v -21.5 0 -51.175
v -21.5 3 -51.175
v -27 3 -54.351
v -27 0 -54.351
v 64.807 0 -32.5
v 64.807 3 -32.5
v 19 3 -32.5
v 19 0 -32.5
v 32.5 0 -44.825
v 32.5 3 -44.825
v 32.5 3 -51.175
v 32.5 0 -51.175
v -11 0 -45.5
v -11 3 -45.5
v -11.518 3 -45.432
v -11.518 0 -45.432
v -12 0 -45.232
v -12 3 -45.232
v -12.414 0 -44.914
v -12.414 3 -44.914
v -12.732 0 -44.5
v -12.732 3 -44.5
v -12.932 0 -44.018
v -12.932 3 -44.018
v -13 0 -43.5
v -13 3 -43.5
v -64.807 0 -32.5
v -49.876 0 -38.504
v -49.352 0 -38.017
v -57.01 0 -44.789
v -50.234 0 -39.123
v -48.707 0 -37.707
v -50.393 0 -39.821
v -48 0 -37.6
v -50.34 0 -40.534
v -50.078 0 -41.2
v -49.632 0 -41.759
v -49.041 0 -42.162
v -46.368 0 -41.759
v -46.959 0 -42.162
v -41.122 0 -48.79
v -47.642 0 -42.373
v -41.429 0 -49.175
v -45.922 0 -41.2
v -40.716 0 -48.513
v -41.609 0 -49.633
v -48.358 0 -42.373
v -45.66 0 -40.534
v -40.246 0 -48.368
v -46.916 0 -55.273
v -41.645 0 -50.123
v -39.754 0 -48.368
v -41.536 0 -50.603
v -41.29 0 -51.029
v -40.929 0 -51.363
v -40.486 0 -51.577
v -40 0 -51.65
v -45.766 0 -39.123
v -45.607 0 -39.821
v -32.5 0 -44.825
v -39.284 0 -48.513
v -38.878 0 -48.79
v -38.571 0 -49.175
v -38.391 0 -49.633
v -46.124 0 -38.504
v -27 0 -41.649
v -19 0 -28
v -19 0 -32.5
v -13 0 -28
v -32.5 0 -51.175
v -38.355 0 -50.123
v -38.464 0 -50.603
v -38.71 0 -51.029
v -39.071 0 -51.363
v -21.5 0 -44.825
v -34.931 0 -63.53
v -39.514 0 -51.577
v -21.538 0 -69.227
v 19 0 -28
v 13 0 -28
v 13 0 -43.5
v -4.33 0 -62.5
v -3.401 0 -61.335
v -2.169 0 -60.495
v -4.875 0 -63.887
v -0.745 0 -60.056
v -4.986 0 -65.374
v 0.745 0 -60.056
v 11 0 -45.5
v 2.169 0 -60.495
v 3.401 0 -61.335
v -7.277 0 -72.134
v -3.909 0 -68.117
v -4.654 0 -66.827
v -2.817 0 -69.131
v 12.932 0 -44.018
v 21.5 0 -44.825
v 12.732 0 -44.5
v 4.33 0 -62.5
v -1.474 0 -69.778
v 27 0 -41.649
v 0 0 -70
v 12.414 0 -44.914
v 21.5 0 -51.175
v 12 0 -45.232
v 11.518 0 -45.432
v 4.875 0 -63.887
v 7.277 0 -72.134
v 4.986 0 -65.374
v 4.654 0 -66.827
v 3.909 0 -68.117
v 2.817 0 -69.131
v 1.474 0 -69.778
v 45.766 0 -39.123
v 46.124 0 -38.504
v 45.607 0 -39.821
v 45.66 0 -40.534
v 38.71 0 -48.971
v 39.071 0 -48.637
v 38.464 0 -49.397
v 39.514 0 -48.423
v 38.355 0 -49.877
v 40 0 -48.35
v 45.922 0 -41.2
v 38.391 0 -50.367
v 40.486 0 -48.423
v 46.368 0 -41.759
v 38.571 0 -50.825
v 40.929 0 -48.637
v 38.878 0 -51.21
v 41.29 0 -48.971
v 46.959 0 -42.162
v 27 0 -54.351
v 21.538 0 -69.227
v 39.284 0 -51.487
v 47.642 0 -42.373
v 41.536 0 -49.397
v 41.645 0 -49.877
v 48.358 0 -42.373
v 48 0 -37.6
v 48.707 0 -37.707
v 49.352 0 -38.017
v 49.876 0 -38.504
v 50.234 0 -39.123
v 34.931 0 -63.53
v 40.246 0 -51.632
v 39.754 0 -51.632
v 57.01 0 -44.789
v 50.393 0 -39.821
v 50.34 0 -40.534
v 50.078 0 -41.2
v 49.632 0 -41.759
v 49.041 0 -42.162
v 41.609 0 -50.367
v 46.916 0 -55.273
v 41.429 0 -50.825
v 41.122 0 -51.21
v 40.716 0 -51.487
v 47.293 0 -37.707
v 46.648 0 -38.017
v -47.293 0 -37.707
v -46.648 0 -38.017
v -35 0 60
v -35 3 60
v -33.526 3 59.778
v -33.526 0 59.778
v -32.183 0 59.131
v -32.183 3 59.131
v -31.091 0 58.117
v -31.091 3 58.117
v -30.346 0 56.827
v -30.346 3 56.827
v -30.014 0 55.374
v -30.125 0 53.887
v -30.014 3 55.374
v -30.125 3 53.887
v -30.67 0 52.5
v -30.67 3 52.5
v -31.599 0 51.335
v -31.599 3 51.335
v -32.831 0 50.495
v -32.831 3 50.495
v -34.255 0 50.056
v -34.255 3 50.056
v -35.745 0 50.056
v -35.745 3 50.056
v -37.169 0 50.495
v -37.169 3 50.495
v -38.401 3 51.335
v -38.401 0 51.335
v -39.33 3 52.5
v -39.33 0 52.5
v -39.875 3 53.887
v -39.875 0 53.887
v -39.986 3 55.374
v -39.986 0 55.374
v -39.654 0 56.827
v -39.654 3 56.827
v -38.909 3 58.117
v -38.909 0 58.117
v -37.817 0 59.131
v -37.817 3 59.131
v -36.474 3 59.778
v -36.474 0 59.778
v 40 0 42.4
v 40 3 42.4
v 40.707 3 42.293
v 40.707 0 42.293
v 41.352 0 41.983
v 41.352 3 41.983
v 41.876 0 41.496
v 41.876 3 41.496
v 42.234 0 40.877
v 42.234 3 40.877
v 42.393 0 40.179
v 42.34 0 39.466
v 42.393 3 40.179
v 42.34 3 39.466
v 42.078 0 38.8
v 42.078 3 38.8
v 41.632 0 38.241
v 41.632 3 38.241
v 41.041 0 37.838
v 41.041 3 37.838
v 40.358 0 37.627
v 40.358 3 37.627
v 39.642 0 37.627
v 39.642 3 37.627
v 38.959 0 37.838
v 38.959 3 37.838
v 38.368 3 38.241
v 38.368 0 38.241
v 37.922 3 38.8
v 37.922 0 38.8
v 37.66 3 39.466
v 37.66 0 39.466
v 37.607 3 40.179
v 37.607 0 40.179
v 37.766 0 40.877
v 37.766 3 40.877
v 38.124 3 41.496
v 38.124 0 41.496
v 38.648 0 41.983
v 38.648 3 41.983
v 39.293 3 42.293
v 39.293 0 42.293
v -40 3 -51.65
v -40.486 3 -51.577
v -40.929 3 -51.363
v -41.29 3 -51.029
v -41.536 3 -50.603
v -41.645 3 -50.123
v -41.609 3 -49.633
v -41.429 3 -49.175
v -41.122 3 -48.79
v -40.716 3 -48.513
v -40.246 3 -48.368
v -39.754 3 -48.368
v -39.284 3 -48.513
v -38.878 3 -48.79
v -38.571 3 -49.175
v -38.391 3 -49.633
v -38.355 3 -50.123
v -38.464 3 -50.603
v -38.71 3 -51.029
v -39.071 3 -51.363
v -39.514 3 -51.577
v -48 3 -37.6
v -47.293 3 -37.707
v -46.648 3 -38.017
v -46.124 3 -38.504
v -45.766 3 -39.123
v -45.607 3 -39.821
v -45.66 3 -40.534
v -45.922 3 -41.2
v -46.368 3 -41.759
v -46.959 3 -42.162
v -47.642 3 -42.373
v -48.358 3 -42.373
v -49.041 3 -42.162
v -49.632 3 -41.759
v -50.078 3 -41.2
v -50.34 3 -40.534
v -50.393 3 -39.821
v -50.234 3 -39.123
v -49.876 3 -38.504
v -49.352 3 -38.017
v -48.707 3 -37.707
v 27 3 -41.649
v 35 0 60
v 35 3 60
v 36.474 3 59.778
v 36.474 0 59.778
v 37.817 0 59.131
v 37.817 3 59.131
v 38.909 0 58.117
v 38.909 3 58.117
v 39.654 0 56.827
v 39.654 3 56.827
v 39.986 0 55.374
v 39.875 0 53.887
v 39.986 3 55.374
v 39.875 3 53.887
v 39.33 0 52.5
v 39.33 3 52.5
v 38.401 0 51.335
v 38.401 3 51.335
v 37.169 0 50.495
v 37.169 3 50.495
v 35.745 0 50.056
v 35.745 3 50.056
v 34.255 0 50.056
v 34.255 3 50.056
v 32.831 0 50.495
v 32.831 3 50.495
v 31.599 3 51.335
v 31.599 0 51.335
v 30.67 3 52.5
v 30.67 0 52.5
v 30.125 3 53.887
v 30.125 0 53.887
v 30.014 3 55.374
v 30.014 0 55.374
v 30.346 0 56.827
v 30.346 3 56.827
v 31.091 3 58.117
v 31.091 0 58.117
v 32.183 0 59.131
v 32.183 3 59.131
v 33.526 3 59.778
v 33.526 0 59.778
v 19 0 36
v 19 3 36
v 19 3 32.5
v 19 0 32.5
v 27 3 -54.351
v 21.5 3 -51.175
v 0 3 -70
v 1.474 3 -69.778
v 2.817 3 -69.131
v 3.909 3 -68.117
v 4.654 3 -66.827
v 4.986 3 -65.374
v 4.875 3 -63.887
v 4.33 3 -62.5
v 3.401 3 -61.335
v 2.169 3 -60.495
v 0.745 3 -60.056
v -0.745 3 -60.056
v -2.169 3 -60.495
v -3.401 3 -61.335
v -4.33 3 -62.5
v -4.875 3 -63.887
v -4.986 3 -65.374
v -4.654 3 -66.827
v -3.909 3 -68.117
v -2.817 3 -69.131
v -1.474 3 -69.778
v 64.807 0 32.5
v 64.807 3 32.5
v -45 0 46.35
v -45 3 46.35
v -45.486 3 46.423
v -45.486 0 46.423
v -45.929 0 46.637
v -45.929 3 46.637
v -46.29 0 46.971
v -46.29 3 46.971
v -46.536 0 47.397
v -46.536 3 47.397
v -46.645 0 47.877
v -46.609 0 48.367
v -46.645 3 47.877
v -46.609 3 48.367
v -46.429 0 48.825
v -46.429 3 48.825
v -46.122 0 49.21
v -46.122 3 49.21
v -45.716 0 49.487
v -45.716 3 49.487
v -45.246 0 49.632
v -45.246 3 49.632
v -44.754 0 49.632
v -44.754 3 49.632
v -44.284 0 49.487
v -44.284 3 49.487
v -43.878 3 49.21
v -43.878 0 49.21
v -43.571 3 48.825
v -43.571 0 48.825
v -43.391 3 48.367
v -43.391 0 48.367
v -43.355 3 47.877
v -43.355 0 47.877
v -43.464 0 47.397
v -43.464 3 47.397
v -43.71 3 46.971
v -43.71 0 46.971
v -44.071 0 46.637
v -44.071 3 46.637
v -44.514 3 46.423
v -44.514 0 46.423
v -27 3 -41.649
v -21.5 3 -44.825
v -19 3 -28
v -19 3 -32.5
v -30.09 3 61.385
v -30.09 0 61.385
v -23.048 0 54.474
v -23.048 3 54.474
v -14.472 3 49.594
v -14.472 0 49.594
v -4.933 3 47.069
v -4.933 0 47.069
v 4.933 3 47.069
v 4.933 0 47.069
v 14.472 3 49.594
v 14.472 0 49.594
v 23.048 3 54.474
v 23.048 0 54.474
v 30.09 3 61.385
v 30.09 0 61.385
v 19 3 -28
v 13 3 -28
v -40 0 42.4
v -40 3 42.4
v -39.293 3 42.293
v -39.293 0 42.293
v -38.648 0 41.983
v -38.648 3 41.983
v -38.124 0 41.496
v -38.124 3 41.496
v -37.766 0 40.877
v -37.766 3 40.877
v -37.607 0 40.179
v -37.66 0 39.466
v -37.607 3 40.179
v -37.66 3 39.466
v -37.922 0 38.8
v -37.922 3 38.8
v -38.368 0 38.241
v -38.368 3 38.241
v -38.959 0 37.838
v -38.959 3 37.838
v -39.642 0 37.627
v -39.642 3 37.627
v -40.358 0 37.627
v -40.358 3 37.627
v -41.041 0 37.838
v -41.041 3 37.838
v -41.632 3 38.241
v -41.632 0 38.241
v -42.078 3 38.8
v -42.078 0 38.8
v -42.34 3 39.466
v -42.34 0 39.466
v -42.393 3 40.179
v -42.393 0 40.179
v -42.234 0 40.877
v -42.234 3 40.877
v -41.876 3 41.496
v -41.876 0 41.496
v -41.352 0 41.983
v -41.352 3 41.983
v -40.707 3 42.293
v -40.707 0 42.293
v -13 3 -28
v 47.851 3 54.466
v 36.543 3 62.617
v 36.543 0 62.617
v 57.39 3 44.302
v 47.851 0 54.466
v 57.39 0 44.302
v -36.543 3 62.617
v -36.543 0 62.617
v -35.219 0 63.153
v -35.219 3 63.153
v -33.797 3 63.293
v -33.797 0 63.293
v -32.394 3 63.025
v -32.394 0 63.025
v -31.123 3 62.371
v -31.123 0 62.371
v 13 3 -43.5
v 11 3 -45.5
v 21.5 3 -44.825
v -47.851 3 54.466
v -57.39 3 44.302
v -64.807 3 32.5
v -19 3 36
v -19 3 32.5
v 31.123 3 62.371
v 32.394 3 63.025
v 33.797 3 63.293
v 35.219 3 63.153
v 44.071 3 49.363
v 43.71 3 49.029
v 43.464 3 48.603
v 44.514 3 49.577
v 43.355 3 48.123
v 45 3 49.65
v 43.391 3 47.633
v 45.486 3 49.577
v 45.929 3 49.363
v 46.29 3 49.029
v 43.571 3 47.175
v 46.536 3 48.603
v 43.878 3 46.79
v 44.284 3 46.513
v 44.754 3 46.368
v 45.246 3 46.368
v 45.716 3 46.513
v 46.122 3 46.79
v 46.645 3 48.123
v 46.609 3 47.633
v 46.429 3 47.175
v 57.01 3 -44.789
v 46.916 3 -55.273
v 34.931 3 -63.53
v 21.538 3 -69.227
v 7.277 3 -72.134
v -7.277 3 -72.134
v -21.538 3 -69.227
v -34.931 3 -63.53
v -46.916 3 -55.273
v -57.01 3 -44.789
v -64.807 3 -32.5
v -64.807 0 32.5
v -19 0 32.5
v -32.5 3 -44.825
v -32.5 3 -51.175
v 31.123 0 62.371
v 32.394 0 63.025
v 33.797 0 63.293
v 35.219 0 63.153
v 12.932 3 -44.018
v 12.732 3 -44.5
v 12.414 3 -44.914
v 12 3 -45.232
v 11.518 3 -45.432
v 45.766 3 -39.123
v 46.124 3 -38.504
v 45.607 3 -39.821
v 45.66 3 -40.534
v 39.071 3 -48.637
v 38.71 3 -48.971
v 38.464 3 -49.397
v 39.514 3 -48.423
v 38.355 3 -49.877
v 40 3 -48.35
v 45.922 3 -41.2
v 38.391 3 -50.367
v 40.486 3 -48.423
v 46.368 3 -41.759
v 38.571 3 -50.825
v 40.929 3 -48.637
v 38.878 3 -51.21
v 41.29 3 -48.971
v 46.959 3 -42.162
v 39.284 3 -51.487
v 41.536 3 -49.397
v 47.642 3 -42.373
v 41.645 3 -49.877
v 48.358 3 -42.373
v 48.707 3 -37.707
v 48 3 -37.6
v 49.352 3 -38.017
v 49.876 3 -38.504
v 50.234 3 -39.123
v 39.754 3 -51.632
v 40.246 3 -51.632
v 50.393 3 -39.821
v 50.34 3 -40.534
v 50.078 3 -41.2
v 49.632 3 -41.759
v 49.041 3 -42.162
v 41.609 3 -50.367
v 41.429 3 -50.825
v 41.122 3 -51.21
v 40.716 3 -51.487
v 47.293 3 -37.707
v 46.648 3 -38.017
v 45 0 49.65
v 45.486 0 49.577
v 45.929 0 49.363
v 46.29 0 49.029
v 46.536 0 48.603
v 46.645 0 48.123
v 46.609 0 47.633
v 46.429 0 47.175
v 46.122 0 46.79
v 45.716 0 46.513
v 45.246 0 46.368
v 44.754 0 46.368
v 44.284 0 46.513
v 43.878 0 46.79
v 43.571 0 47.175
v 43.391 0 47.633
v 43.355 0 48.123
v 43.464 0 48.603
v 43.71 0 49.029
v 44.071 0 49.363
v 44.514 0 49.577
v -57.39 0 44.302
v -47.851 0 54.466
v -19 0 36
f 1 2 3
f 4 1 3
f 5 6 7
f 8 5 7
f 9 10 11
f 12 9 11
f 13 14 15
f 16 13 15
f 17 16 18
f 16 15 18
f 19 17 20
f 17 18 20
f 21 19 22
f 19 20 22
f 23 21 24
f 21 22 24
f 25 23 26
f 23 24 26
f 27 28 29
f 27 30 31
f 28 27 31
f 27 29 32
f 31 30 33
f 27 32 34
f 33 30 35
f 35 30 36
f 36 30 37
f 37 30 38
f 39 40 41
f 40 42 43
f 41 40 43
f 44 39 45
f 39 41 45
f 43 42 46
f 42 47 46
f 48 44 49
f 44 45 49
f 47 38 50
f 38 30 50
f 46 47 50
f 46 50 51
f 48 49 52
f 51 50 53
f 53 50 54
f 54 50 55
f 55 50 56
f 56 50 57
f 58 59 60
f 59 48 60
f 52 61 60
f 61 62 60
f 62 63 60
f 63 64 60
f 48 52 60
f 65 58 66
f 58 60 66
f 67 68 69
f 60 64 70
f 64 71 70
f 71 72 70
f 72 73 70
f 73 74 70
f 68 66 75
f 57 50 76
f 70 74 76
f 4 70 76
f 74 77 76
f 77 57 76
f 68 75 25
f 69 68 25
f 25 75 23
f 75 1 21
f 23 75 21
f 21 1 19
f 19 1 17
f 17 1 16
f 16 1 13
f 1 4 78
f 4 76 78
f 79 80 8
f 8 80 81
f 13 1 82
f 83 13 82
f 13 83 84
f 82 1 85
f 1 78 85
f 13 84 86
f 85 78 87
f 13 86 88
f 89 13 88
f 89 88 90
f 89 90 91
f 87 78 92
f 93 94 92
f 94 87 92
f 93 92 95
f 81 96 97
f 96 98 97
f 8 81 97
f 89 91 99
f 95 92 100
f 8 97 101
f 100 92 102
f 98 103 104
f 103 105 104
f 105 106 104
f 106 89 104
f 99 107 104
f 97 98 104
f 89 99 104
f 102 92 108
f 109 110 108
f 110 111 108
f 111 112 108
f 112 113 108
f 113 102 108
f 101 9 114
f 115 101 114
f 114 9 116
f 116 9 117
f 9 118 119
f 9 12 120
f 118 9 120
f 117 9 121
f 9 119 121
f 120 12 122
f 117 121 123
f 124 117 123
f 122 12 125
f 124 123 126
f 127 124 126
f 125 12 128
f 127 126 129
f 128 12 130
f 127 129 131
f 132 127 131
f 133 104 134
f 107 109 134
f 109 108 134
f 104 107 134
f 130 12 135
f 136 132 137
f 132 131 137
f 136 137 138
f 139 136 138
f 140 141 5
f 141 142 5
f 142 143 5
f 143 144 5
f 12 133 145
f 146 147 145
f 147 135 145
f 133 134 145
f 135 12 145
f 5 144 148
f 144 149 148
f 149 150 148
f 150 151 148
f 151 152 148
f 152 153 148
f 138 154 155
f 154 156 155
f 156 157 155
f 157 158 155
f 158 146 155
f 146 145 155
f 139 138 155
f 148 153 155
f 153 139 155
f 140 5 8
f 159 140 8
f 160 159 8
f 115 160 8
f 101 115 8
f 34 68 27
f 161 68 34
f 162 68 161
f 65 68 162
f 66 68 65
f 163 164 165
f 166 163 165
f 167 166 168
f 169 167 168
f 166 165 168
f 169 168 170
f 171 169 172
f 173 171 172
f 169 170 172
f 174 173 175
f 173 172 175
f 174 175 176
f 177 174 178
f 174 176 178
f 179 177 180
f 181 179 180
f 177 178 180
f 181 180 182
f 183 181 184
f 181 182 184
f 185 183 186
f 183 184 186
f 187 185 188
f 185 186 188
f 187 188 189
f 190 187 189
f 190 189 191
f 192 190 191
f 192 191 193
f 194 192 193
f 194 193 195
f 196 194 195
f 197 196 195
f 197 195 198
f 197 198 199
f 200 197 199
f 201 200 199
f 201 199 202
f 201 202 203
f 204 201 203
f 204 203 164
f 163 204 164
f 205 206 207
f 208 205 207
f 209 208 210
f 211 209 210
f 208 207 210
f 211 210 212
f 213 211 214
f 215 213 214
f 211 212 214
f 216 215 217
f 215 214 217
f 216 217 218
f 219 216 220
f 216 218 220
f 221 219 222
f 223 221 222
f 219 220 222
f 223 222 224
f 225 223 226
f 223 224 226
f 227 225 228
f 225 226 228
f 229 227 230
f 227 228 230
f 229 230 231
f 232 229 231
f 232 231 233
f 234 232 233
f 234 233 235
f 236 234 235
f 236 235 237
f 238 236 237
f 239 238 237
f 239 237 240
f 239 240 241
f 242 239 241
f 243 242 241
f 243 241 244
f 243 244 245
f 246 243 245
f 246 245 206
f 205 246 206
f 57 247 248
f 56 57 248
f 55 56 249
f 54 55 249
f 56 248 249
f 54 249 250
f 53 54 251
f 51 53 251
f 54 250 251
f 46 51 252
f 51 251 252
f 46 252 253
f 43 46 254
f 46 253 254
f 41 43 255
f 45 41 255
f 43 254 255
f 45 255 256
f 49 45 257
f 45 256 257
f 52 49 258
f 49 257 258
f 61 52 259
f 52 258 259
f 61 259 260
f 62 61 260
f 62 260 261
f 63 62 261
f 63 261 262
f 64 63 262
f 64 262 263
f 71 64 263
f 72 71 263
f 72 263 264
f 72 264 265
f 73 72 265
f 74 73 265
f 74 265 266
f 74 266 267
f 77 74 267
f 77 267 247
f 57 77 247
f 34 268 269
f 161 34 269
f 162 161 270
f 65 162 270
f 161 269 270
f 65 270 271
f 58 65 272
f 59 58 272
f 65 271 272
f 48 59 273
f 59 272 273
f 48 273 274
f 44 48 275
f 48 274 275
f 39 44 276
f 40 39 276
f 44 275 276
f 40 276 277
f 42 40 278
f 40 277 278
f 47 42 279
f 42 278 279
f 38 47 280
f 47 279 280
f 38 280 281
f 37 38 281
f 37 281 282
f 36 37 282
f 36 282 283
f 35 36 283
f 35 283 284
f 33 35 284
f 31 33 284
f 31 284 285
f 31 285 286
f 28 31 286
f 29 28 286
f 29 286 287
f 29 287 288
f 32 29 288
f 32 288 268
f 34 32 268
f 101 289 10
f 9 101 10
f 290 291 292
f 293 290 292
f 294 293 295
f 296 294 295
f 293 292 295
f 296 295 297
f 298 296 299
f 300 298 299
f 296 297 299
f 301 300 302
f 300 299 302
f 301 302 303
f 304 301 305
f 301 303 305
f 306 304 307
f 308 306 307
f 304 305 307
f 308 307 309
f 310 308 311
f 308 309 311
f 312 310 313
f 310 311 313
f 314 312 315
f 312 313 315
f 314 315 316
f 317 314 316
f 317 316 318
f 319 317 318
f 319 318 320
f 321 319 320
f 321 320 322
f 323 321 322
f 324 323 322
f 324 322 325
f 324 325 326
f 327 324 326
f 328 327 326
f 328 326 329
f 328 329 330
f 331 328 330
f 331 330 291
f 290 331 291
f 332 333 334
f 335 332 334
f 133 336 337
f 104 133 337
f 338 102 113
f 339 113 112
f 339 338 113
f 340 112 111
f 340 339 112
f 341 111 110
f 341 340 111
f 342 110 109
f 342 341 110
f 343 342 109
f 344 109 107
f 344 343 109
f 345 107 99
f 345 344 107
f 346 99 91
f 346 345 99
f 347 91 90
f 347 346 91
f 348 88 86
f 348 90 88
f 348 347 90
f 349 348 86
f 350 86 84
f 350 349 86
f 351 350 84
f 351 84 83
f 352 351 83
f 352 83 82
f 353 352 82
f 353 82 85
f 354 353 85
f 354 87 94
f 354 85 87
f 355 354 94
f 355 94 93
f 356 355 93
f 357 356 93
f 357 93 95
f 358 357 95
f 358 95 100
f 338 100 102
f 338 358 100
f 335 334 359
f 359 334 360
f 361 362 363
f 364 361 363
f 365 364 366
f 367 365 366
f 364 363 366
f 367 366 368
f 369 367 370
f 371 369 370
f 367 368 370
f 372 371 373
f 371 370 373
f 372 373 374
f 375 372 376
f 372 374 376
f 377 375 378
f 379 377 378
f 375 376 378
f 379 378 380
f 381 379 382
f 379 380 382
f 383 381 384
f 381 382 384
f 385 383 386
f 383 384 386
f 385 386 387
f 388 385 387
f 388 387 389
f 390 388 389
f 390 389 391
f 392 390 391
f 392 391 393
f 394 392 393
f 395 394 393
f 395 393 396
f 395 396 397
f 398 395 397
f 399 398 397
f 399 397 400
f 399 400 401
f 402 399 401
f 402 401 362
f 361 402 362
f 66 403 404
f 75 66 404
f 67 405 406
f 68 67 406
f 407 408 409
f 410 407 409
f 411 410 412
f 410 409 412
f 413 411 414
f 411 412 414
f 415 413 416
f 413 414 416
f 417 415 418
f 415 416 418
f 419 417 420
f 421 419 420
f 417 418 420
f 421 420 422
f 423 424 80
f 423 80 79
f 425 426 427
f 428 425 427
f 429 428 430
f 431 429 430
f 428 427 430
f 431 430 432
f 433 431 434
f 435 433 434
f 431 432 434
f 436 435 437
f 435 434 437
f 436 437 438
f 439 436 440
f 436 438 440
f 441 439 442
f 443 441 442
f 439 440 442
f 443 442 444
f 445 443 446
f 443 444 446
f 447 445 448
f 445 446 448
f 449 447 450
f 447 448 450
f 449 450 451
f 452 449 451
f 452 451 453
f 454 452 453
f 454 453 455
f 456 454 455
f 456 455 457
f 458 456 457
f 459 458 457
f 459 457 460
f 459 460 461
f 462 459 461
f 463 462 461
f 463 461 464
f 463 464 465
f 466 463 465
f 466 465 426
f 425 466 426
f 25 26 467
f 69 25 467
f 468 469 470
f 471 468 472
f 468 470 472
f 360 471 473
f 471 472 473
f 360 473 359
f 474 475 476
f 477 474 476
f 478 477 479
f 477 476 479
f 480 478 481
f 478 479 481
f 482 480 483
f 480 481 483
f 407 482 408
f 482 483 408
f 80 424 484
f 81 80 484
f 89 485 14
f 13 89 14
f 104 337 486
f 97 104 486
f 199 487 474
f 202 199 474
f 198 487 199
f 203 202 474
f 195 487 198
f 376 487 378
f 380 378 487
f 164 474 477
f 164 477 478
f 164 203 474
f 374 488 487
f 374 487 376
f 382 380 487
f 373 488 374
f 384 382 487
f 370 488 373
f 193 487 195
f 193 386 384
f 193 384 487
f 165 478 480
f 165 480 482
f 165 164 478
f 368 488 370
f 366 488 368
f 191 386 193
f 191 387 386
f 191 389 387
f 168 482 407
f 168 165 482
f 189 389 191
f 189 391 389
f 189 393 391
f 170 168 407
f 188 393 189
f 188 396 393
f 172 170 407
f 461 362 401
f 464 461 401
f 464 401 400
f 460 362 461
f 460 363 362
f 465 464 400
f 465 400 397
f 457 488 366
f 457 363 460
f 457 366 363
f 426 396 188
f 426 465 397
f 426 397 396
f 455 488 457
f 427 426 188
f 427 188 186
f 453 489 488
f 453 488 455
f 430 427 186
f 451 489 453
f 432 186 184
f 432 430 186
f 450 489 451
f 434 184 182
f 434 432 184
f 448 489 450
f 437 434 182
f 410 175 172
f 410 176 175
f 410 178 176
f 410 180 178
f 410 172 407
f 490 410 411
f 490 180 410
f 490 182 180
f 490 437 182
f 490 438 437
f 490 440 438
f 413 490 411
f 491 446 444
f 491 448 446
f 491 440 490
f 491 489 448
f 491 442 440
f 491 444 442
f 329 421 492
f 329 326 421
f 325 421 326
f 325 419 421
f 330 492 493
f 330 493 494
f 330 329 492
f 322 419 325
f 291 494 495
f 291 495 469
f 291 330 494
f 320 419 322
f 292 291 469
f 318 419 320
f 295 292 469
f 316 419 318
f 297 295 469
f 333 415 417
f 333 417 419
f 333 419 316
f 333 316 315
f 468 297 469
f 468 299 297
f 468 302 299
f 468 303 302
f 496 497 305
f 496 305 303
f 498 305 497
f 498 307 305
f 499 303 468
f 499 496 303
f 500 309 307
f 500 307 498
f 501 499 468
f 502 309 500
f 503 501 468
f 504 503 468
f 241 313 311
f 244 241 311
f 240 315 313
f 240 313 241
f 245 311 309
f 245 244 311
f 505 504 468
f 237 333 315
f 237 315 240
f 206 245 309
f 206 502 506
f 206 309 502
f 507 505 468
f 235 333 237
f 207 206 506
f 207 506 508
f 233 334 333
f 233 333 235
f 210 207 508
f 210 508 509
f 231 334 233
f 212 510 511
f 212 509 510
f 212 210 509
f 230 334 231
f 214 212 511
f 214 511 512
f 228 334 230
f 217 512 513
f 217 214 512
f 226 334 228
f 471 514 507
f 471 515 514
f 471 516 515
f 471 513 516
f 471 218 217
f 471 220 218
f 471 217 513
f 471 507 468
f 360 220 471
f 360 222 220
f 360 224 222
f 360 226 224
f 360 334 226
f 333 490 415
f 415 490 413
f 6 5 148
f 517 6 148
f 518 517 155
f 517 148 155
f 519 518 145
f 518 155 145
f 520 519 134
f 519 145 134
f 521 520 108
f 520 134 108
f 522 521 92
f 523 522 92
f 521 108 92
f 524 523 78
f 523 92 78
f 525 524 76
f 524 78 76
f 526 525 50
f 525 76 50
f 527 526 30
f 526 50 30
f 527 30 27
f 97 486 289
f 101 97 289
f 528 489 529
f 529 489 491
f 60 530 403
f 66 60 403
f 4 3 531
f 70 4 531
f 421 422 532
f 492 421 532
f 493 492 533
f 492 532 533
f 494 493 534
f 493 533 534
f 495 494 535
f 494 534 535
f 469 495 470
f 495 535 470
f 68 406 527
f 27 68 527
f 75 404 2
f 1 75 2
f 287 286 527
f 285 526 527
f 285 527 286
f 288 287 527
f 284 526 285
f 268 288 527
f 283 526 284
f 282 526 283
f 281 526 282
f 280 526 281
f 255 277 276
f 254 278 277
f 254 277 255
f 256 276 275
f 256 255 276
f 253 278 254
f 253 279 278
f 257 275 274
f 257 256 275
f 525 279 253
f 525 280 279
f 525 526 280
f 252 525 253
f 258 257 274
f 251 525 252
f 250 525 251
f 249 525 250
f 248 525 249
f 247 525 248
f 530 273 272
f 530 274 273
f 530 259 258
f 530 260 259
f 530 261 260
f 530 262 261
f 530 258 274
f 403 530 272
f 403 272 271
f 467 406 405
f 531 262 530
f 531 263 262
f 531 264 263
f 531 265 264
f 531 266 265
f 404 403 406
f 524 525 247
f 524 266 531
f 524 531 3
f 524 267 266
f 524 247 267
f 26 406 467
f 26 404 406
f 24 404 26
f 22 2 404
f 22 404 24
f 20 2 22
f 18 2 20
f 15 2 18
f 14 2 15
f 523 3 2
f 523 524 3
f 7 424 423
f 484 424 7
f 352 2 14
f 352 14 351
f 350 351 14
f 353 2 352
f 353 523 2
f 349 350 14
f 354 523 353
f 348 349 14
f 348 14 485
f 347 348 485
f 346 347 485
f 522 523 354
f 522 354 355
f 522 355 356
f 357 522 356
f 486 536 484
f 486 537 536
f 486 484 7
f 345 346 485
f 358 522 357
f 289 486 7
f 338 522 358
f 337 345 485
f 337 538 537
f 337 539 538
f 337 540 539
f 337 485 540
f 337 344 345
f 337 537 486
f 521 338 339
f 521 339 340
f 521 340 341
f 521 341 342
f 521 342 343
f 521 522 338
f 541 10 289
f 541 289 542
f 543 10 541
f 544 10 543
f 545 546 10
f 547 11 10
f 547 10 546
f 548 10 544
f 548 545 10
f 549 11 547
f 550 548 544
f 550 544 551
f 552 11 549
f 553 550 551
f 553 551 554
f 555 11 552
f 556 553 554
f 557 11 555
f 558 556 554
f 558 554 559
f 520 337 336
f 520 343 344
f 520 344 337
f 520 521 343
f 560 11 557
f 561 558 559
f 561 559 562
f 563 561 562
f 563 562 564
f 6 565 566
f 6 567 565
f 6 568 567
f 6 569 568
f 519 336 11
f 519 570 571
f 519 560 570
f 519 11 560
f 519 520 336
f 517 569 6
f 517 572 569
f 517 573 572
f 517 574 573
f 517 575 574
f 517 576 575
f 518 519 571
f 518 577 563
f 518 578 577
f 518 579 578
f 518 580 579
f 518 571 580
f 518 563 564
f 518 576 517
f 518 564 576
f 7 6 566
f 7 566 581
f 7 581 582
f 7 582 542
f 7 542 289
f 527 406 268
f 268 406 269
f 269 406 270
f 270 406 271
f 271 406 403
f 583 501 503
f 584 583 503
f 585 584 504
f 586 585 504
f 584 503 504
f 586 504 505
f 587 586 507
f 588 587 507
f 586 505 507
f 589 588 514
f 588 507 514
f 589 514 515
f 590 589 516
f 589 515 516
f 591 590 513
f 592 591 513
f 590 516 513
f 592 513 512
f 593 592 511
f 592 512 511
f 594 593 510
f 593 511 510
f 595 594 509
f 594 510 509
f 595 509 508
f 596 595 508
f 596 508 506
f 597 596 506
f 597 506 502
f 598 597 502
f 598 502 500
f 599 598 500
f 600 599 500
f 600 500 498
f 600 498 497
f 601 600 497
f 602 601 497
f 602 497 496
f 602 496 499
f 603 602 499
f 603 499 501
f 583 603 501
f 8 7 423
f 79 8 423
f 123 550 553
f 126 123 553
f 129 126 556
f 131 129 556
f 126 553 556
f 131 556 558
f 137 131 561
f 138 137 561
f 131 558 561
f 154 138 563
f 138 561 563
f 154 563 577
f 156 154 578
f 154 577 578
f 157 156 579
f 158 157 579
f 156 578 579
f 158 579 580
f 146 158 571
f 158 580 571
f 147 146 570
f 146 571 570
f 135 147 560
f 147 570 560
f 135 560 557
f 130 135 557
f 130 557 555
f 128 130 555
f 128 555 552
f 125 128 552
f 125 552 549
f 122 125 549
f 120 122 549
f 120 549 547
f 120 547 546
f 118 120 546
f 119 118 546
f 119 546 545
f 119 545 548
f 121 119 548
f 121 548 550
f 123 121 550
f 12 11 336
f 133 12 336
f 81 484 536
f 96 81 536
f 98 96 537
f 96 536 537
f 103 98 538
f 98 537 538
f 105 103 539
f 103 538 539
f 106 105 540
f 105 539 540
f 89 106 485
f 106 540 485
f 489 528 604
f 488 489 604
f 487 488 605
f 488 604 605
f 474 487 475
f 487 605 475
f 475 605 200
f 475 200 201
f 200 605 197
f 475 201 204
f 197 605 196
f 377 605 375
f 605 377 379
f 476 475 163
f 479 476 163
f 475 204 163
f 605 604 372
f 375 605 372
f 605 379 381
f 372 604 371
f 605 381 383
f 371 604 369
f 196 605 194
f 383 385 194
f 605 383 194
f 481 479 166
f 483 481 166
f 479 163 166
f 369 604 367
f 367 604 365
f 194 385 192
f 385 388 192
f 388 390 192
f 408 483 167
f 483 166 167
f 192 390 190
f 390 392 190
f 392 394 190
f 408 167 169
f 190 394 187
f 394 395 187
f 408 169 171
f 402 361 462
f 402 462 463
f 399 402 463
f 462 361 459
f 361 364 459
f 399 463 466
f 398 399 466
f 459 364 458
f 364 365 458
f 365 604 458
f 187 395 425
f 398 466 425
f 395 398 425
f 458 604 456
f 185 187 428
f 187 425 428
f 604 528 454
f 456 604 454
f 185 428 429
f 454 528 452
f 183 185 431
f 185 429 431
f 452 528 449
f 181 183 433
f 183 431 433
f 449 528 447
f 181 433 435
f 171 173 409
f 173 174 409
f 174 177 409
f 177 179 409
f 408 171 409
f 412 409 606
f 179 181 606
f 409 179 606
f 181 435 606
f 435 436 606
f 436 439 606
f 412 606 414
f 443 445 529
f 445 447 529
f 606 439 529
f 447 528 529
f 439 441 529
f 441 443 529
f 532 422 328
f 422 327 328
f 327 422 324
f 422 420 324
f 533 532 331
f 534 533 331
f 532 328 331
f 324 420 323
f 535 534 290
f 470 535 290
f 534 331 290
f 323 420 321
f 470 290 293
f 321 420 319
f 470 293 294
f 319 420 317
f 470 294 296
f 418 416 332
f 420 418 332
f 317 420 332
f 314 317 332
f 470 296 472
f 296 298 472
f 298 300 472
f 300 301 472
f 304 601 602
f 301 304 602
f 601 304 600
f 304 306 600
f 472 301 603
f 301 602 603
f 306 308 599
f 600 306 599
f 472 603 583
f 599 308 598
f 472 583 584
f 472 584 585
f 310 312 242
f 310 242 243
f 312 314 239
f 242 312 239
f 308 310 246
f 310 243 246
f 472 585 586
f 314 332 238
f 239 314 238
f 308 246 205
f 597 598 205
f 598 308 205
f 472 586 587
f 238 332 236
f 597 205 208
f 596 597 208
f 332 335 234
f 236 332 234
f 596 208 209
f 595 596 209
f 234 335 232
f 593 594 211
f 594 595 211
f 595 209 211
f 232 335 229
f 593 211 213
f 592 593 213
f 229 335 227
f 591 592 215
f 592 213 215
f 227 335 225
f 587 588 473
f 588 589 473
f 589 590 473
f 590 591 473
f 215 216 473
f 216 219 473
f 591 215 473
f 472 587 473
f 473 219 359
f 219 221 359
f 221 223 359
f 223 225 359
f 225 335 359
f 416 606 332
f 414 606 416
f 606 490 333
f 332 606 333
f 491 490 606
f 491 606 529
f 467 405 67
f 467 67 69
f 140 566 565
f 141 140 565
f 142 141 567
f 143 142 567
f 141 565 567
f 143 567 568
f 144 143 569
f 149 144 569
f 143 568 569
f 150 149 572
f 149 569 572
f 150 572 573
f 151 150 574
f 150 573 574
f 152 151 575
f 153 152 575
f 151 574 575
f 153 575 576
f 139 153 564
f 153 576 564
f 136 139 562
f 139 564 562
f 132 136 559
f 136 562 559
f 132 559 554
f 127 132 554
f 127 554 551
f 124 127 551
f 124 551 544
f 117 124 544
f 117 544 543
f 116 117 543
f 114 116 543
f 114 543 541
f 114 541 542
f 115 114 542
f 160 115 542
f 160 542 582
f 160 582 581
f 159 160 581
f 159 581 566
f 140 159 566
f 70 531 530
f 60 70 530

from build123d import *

# Parameters (mm, degrees)
BOSS_EXTRUDE1_DEPTH  = 3
SOLENOID_PLACEMENT_W = 38
SOLENOID_PLACEMENT_H = 64
CUT_EXTRUDE1_DEPTH   = 103.574363269
CUT_EXTRUDE4_DEPTH   = 103.574363269
CUT_EXTRUDE5_DEPTH   = 103.574363269
SKETCH6_R            = 2.4
CUT_EXTRUDE6_DEPTH   = 103.574363269
CUT_EXTRUDE3_DEPTH   = 103.574363269
SKETCH7_R            = 5
CUT_EXTRUDE7_DEPTH   = 98.289516393
SKETCH8_R            = 5
CUT_EXTRUDE9_DEPTH   = 98.289516393
SKETCH9_R            = 1.65
CUT_EXTRUDE10_DEPTH  = 98.289516393


with BuildPart() as part:
    # Sketch1 → Boss-Extrude1 (new body)
    with BuildSketch(Plane(origin=(0, 0, 0), x_dir=(1, 0, 0), z_dir=(0, 1, 0))):
        with BuildLine():
            ThreePointArc((36.543377003, -62.616544118), (0, 72.5), (-36.543377003, -62.616544118))
            ThreePointArc((-36.543377003, -62.616544118), (-33.085954668, -63.20954405), (-30.089832649, -61.38507948))
            ThreePointArc((-30.089832649, -61.38507948), (0, -46.75), (30.089832649, -61.38507948))
            ThreePointArc((30.089832649, -61.38507948), (33.085954668, -63.20954405), (36.543377003, -62.616544118))
        make_face()
    extrude(amount=BOSS_EXTRUDE1_DEPTH)

    # solenoid placement → Cut-Extrude1 (cut, through all)
    with BuildSketch(Plane(origin=(0, 3, 0), x_dir=(1, 0, 0), z_dir=(0, 1, 0))):
        with Locations((0, -4)):
            Rectangle(SOLENOID_PLACEMENT_W, SOLENOID_PLACEMENT_H)
    extrude(amount=-CUT_EXTRUDE1_DEPTH, mode=Mode.SUBTRACT)

    # Sketch4 → Cut-Extrude4 (cut, through all)
    with BuildSketch(Plane(origin=(0, 3, 0), x_dir=(1, 0, 0), z_dir=(0, 1, 0))):
        with BuildLine():
            Line((13, 28), (13, 43.5))
            ThreePointArc((13, 43.5), (12.414213562, 44.914213562), (11, 45.5))
            Line((11, 45.5), (-11, 45.5))
            ThreePointArc((-11, 45.5), (-12.414213562, 44.914213562), (-13, 43.5))
            Line((-13, 43.5), (-13, 28))
            Line((-13, 28), (13, 28))
        make_face()
    extrude(amount=-CUT_EXTRUDE4_DEPTH, mode=Mode.SUBTRACT)

    # Sketch5 → Cut-Extrude5 (cut, through all)
    with BuildSketch(Plane(origin=(0, 3, 0), x_dir=(1, 0, 0), z_dir=(0, 1, 0))):
        Polygon((-21.5, 51.175426481), (-27, 54.350852961), (-32.5, 51.175426481), (-32.5, 44.824573519), (-27, 41.649147039), (-21.5, 44.824573519), align=None)
        Polygon((21.5, 51.175426481), (21.5, 44.824573519), (27, 41.649147039), (32.5, 44.824573519), (32.5, 51.175426481), (27, 54.350852961), align=None)
    extrude(amount=-CUT_EXTRUDE5_DEPTH, mode=Mode.SUBTRACT)

    # Sketch6 → Cut-Extrude6 (cut, through all)
    with BuildSketch(Plane(origin=(0, 3, 0), x_dir=(1, 0, 0), z_dir=(0, 1, 0))):
        with Locations(Location((40, -40, 0), (0, 0, 270))):
            Circle(SKETCH6_R)
        with Locations(Location((-40, -40, 0), (0, 0, 270))):
            Circle(SKETCH6_R)
        with Locations(Location((48, 40, 0), (0, 0, 270))):
            Circle(SKETCH6_R)
        with Locations(Location((-48, 40, 0), (0, 0, 270))):
            Circle(SKETCH6_R)
    extrude(amount=-CUT_EXTRUDE6_DEPTH, mode=Mode.SUBTRACT)

    # Sketch3 → Cut-Extrude3 (cut, through all)
    with BuildSketch(Plane(origin=(0, 3, 0), x_dir=(1, 0, 0), z_dir=(0, 1, 0))):
        Polygon((-19, 28), (-19, 32.5), (-72.5, 32.5), (-72.5, -32.5), (72.5, -32.5), (72.5, 32.5), (19, 32.5), (19, 28), align=None)
    extrude(amount=-CUT_EXTRUDE3_DEPTH, mode=Mode.SUBTRACT)


with BuildPart() as cut_extrude3_piece_1:
    # of the separate pieces the step leaves, piece 1, a body of its own (cut_extrude3_pieces)
    add(part.part.solids().sort_by_distance((64.807406984, 0, -32.5))[0])

    # Sketch8 → Cut-Extrude9 (cut, through all)
    with BuildSketch(Plane.XZ.offset(-3)):
        with Locations(Location((0, -65, 0), (0, 0, 270))):
            Circle(SKETCH8_R)
    extrude(amount=CUT_EXTRUDE9_DEPTH, mode=Mode.SUBTRACT)


with BuildPart() as cut_extrude3_piece_2:
    # of the separate pieces the step leaves, piece 2, a body of its own (cut_extrude3_pieces)
    add(part.part.solids().sort_by_distance((-36.543377003, 0, 62.616544118))[0])

    # Sketch7 → Cut-Extrude7 (cut, through all)
    with BuildSketch(Plane(origin=(0, 3, 0), x_dir=(1, 0, 0), z_dir=(0, 1, 0))):
        with Locations(Location((35, -55, 0), (0, 0, 270))):
            Circle(SKETCH7_R)
        with Locations(Location((-35, -55, 0), (0, 0, 270))):
            Circle(SKETCH7_R)
    extrude(amount=-CUT_EXTRUDE7_DEPTH, mode=Mode.SUBTRACT)


with BuildPart() as cut_extrude10_tool:
    # Sketch9 → Cut-Extrude10 (new, through all)
    with BuildSketch(Plane(origin=(0, 3, 0), x_dir=(1, 0, 0), z_dir=(0, 1, 0))):
        with Locations(Location((45, -48, 0), (0, 0, 270))):
            Circle(SKETCH9_R)
        with Locations(Location((-45, -48, 0), (0, 0, 90))):
            Circle(SKETCH9_R)
        with Locations(Location((40, 50, 0), (0, 0, 270))):
            Circle(SKETCH9_R)
        with Locations(Location((-40, 50, 0), (0, 0, 90))):
            Circle(SKETCH9_R)
    extrude(amount=-CUT_EXTRUDE10_DEPTH)


with BuildPart() as cut_extrude3_piece_1_1:
    add(cut_extrude3_piece_1.part)

    # Cut-Extrude10: cut by cut_extrude10_tool
    add(cut_extrude10_tool.part, mode=Mode.SUBTRACT)


with BuildPart() as cut_extrude3_piece_2_1:
    add(cut_extrude3_piece_2.part)

    # Cut-Extrude10: cut by cut_extrude10_tool
    add(cut_extrude10_tool.part, mode=Mode.SUBTRACT)


solid = Compound([cut_extrude3_piece_1_1.part, cut_extrude3_piece_2_1.part])
